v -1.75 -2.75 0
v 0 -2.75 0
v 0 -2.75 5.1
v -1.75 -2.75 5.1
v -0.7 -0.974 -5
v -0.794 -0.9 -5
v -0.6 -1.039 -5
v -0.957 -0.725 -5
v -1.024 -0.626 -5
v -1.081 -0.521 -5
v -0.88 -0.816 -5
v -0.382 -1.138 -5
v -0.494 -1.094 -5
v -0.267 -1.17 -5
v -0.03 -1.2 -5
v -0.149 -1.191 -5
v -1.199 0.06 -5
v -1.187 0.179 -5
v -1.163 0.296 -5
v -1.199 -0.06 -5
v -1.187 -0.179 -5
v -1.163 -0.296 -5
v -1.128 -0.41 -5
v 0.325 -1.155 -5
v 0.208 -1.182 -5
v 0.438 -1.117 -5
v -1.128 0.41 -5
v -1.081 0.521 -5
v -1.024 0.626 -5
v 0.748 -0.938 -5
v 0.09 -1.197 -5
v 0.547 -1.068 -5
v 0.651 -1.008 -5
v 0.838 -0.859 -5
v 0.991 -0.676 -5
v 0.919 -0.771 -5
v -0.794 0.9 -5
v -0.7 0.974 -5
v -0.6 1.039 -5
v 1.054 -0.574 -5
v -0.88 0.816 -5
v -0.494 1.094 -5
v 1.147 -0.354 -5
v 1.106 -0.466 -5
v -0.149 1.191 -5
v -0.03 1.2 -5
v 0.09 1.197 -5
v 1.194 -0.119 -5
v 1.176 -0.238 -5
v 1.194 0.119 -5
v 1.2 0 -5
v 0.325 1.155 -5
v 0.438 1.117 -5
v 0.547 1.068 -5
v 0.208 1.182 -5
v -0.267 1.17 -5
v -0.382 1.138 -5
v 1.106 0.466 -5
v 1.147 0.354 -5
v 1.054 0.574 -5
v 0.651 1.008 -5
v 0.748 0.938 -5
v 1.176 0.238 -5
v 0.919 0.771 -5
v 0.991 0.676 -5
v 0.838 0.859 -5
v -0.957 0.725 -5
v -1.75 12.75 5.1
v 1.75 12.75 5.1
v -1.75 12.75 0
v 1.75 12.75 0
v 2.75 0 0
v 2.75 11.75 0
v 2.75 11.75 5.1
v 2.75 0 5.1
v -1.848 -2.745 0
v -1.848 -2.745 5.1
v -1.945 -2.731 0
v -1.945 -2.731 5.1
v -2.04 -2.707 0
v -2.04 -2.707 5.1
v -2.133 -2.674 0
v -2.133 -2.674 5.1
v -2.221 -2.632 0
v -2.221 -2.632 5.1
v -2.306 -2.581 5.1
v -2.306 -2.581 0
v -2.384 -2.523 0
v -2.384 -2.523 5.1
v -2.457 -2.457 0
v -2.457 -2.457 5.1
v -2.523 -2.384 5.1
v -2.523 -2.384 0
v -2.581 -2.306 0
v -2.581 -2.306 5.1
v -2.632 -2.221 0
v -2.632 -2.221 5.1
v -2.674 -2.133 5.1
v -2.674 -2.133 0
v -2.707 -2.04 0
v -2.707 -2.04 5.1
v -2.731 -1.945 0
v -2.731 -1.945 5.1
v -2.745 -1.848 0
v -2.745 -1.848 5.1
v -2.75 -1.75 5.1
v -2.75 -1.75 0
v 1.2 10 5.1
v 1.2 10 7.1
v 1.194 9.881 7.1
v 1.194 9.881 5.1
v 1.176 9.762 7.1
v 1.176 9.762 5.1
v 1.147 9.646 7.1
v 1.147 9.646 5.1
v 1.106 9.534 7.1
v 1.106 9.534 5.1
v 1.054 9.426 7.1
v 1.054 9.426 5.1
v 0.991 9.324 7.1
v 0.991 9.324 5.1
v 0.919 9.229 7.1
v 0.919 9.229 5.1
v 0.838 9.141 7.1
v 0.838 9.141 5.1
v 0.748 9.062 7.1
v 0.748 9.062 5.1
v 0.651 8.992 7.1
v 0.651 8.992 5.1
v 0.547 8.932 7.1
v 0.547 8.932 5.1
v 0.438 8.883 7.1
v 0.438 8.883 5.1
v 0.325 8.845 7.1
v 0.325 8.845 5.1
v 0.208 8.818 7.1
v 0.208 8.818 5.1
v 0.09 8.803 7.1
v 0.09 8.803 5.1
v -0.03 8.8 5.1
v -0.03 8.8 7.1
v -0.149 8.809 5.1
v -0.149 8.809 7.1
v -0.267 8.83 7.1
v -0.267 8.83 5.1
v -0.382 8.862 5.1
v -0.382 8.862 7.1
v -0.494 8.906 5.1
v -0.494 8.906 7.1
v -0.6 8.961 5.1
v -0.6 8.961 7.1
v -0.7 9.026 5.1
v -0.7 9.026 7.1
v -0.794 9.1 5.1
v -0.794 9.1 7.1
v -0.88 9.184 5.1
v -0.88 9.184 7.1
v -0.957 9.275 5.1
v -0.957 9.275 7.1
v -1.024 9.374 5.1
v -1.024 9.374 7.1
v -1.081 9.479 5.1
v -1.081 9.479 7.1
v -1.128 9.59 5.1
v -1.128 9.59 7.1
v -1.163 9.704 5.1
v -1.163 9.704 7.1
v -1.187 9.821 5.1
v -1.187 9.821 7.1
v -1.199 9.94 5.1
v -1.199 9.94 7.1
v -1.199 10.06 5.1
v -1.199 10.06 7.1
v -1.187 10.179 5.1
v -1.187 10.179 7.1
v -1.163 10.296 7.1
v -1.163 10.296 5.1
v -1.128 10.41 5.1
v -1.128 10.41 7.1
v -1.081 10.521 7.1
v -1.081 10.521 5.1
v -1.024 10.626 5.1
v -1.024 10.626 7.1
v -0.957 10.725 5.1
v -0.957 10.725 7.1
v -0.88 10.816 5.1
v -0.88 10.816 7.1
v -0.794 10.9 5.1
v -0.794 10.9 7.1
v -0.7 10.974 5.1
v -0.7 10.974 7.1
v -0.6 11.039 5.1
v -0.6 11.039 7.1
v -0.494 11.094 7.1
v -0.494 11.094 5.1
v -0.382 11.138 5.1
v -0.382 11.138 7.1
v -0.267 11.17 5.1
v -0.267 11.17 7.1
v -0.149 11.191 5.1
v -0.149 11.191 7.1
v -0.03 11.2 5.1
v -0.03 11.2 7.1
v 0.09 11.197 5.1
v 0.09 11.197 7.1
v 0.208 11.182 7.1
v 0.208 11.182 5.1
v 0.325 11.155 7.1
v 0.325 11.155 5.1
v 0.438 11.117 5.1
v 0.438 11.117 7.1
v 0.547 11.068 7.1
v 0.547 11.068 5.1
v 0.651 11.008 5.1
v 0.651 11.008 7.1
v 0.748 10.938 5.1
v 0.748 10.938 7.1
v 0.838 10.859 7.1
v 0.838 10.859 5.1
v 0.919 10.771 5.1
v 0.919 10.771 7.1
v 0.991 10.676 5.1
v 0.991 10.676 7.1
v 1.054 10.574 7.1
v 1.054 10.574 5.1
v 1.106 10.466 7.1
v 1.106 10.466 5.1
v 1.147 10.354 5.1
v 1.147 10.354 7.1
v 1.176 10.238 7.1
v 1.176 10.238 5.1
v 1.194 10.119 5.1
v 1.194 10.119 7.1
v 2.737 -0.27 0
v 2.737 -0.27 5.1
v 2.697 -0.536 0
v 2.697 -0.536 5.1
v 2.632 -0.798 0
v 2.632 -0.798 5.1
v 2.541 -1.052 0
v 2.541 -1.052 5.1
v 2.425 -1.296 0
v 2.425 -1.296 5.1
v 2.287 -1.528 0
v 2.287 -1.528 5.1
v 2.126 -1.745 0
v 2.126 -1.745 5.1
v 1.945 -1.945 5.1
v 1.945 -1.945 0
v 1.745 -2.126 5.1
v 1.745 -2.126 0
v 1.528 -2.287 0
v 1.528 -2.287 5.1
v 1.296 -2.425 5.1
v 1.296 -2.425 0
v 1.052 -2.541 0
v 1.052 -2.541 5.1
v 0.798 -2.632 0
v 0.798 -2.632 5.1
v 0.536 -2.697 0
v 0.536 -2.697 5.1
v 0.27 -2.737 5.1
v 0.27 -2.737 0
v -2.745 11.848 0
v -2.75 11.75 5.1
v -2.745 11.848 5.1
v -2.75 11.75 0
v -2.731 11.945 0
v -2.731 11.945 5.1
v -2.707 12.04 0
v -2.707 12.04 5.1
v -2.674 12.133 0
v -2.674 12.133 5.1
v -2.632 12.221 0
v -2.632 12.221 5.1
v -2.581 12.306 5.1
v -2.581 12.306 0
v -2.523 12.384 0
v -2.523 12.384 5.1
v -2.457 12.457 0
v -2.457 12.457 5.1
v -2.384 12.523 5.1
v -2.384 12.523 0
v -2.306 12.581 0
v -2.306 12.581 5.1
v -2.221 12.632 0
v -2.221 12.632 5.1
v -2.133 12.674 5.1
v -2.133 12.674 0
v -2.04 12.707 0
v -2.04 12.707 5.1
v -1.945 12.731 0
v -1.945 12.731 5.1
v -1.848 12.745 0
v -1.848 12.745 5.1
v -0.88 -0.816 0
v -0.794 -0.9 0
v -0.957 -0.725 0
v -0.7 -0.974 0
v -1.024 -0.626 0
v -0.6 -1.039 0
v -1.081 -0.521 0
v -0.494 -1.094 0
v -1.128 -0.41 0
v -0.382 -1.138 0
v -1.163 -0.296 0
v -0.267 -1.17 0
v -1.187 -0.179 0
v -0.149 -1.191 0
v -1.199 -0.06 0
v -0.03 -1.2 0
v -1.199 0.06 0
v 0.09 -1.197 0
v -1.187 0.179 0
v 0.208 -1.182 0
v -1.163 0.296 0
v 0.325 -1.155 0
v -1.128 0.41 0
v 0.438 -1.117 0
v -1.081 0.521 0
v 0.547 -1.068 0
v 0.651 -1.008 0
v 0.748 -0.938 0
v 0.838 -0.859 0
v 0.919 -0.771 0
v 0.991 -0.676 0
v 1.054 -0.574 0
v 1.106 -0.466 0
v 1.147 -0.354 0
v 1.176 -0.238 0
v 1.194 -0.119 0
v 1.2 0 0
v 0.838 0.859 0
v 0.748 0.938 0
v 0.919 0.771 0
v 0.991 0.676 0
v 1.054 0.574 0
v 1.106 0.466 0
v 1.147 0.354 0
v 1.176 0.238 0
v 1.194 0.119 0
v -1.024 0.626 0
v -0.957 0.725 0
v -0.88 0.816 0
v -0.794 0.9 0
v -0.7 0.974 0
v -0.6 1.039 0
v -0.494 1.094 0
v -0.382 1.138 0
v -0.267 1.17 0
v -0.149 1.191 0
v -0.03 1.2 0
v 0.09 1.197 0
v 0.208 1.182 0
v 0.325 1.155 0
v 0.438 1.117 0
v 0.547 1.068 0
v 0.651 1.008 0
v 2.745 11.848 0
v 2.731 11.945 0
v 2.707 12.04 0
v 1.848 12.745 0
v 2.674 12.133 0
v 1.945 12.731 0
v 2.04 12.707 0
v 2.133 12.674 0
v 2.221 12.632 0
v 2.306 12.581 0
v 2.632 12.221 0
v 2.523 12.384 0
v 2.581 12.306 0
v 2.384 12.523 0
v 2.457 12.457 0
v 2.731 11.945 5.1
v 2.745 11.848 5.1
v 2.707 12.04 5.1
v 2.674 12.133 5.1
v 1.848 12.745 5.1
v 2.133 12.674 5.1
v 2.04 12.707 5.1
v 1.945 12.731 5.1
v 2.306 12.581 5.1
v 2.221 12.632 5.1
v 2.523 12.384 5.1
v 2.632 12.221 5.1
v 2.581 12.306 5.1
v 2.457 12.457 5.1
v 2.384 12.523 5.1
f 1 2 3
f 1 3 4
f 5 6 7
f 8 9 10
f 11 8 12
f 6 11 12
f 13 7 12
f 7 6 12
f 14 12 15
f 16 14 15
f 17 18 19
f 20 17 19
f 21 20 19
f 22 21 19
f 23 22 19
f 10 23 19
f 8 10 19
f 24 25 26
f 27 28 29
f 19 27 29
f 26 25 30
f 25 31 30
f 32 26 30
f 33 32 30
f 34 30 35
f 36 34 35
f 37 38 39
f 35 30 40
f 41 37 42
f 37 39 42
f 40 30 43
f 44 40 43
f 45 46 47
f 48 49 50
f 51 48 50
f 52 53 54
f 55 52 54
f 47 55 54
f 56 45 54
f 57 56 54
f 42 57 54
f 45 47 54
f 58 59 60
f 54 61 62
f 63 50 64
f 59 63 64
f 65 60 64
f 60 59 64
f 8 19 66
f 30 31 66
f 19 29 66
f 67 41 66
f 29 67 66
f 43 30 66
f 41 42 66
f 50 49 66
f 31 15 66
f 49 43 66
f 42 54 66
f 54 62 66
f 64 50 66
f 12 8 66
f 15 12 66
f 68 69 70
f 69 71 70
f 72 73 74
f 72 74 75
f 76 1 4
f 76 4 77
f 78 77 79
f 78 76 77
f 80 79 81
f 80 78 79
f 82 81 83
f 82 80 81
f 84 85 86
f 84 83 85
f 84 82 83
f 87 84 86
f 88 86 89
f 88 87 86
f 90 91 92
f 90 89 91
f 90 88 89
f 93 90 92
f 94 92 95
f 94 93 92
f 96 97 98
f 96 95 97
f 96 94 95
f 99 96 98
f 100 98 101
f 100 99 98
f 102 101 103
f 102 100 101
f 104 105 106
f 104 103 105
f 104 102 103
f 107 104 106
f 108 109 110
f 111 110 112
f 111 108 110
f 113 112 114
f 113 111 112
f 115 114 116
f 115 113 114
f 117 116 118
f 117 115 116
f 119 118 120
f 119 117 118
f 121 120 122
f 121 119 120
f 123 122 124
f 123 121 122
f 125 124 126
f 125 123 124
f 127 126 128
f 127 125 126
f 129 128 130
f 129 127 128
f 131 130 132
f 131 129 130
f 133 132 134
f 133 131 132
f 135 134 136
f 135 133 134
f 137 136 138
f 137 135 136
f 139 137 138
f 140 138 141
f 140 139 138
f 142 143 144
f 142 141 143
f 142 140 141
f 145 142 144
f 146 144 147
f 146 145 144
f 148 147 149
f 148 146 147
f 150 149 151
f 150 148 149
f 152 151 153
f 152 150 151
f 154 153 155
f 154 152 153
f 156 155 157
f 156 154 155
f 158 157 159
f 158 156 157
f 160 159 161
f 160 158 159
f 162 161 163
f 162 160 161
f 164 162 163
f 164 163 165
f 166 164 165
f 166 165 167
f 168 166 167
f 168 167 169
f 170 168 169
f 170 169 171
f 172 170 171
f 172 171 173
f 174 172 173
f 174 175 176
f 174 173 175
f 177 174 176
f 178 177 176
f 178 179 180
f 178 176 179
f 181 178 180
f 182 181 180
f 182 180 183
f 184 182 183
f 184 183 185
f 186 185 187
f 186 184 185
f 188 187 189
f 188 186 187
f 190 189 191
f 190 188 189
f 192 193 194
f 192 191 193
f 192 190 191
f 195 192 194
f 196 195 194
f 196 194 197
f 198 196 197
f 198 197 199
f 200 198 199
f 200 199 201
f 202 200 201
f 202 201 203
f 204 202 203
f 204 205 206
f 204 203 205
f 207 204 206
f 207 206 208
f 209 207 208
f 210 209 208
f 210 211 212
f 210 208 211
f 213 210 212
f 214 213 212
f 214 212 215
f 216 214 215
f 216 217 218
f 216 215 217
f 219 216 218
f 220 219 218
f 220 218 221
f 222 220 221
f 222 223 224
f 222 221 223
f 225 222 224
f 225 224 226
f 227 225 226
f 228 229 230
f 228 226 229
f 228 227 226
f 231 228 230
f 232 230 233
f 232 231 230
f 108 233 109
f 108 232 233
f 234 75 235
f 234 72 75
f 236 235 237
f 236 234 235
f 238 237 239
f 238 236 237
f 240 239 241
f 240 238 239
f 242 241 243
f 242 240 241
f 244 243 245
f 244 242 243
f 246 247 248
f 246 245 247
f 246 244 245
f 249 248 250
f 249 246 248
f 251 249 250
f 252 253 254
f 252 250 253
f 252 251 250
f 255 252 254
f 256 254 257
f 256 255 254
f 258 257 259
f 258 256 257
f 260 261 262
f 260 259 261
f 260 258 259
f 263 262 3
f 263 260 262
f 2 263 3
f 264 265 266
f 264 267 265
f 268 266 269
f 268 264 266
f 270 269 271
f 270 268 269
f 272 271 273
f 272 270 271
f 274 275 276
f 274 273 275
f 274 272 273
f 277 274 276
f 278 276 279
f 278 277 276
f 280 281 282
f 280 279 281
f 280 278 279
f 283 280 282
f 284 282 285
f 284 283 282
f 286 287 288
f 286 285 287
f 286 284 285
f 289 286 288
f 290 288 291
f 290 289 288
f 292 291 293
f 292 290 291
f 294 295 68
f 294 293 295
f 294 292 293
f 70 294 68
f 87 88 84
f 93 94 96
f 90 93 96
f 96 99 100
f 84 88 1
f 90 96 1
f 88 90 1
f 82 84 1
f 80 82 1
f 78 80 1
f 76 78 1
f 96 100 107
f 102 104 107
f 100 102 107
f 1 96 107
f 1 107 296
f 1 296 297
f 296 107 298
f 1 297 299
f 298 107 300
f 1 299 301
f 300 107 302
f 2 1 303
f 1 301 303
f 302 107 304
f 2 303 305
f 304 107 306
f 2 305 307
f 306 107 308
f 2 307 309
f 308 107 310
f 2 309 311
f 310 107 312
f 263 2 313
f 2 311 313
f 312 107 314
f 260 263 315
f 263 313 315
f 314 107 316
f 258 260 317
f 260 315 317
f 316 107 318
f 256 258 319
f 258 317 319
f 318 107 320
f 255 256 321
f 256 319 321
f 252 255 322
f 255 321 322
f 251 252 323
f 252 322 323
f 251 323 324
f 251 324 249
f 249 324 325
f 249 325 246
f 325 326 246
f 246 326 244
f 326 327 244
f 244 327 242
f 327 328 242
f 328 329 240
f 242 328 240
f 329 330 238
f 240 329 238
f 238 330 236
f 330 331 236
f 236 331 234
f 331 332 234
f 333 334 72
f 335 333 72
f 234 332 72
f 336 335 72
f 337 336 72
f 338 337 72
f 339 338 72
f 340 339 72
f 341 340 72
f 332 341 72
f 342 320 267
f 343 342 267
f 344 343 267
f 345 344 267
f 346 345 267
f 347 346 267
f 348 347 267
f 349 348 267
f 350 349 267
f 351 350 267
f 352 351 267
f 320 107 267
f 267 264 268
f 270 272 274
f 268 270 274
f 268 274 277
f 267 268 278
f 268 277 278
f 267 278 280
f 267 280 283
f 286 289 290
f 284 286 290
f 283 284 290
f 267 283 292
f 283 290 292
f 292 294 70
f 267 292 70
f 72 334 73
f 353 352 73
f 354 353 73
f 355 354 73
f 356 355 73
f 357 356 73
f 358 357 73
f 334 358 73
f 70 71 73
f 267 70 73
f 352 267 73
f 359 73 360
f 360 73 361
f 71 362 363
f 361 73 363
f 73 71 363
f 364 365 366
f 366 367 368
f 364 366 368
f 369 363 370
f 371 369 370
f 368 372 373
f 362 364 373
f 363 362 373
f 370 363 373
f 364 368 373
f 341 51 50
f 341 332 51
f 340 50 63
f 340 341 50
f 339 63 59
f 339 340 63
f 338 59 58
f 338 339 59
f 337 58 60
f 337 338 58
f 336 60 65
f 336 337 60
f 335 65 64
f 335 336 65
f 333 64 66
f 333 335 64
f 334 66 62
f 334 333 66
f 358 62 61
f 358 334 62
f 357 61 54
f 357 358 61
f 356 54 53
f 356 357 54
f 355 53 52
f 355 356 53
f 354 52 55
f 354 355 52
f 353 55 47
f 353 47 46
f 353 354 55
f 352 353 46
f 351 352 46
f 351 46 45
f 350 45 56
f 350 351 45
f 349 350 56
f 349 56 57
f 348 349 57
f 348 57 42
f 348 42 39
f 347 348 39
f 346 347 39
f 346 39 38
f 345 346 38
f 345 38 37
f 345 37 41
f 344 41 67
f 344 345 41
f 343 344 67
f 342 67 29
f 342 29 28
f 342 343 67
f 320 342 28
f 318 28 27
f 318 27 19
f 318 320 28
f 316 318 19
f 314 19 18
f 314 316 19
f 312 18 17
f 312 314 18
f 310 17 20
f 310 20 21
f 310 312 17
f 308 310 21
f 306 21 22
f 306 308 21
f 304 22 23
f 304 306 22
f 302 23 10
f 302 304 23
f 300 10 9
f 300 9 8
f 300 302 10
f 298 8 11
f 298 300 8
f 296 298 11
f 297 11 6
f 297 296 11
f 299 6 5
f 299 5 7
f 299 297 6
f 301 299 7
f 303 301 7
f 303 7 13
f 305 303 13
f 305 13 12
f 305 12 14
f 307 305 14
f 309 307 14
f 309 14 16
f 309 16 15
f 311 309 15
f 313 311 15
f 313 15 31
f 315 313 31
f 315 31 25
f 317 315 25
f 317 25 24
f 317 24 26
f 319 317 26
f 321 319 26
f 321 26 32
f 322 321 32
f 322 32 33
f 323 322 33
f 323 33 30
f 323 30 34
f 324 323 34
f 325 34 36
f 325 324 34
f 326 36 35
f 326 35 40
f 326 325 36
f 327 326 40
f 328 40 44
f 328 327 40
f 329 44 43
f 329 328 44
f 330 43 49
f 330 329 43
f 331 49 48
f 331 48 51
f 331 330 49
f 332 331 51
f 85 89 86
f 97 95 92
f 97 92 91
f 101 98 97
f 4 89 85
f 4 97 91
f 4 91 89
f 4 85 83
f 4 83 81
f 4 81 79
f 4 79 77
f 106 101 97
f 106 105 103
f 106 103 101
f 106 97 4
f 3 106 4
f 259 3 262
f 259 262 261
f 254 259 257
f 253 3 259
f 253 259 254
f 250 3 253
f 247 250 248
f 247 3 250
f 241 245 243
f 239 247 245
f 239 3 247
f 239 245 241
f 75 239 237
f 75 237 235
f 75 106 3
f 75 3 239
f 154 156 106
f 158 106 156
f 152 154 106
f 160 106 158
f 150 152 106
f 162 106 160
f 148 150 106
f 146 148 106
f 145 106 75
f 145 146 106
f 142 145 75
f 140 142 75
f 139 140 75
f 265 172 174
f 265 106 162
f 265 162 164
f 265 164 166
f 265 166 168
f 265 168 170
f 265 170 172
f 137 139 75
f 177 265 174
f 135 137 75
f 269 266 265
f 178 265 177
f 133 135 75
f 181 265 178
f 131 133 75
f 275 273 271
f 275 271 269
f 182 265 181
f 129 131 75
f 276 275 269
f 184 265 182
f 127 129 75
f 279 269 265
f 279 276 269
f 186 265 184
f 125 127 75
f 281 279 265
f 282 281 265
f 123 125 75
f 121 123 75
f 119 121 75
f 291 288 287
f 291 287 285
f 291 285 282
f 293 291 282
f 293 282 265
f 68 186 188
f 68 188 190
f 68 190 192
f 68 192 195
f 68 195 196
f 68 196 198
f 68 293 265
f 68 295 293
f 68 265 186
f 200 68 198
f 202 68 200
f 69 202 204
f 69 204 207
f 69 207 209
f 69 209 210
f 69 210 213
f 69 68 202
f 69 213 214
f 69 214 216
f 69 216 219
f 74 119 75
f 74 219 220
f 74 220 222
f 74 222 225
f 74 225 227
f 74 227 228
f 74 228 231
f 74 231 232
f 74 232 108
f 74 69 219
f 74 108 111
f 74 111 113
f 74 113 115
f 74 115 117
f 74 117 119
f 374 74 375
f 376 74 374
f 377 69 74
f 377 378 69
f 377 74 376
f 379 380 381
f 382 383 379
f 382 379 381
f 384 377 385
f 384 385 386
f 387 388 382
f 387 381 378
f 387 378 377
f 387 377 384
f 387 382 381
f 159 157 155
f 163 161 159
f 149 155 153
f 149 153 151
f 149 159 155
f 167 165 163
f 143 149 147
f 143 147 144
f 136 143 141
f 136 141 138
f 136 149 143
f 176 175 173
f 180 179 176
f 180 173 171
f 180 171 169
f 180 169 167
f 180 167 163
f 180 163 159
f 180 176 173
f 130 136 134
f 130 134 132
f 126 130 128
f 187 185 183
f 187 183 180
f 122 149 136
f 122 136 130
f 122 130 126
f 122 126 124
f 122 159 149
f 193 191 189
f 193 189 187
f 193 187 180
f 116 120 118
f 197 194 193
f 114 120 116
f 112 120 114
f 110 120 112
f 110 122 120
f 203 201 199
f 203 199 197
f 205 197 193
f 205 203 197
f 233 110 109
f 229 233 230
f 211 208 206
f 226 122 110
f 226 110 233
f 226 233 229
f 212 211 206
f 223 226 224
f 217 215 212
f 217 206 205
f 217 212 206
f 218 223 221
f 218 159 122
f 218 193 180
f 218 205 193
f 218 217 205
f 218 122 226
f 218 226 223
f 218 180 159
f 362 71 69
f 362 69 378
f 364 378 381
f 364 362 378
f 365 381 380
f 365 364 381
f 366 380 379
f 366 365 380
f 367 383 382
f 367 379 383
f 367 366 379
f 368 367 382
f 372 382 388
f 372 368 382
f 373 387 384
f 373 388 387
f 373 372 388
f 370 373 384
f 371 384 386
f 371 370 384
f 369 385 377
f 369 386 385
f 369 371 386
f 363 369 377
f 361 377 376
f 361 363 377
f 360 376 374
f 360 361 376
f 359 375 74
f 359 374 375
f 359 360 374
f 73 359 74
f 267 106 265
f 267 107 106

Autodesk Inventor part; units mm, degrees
ref_plane "YZ Plane" through (0, 0, 0) normal (1, 0, 0) x (0, 1, 0)
ref_plane "XZ Plane" through (0, 0, 0) normal (0, 1, 0) x (-1, 0, 0)
ref_plane "XY Plane" through (0, 0, 0) normal (0, 0, 1) x (1, 0, 0)
sketch "Sketch1" plane through (0, 0, 0) normal (0, 0, 1) x (1, 0, 0)
  circle A0 centre (0, 0) radius 1.2
  circle A1 centre (0, 0) radius 2.75
  line L0 (-1.75, 2.75) -> (1.75, 2.75)
  line L1 (2.75, 1.75) -> (2.75, -1.75)
  line L2 (1.75, -2.75) -> (-1.75, -2.75)
  line L3 (-2.75, -1.75) -> (-2.75, 1.75)
  arc A2 (-1.75, 2.75) -> (-2.75, 1.75) centre (-1.75, 1.75) ccw
  arc A3 (2.75, 1.75) -> (1.75, 2.75) centre (1.75, 1.75) ccw
  arc A4 (1.75, -2.75) -> (2.75, -1.75) centre (1.75, -1.75) ccw
  arc A5 (-2.75, -1.75) -> (-1.75, -2.75) centre (-1.75, -1.75) ccw
  line L4 (-2.75, 0) -> (2.75, 0)
  line L5 (2.75, 0) -> (2.75, 11.75)
  line L6 (1.75, 12.75) -> (-1.75, 12.75)
  line L7 (-2.75, 11.75) -> (-2.75, 0)
  circle A6 centre (0, 10) radius 2.75
  circle A7 centre (0, 10) radius 1.2
  arc A8 (-1.75, 12.75) -> (-2.75, 11.75) centre (-1.75, 11.75) ccw
  arc A9 (2.75, 11.75) -> (1.75, 12.75) centre (1.75, 11.75) ccw
  point P0 (-2.75, 0)
  point P1 (0, -2.75)
  point P2 (0, 0)
  point P3 (-2.75, 1.75)
  point P4 (2.75, 0)
  dimension "d0" = 2.4
  dimension "d1" = 5.5
  dimension "d2" = 1
  dimension "d3" = 1
  dimension "d4" = 1
  dimension "d11" = 2.4
  dimension "d12" = 10
  dimension "d13" = 1
  dimension "d14" = 1
extrude "Extrusion1" add sketch "Sketch1" against normal blind 5 contours L4 A0 | A0 L4
extrude "Extrusion2" add sketch "Sketch1" along normal blind 5.1 contours L4 A0 | L4 A1 A0 | A0 L4 A1 | A0 L4 | A1 L0 A3 L1 | L3 A2 L0 A1 | A1 L2 A5 L3 | L0 A2 L7 A6 L5 A3 | A6 L6 A9 L5 | A6 | L7 A8 L6 A6 | A7
extrude "Extrusion3" add sketch "Sketch1" along normal blind 7.1 contours A7
equation "\"d11\" = d0"
properties part number "rpi_base_back_3DPrint"
